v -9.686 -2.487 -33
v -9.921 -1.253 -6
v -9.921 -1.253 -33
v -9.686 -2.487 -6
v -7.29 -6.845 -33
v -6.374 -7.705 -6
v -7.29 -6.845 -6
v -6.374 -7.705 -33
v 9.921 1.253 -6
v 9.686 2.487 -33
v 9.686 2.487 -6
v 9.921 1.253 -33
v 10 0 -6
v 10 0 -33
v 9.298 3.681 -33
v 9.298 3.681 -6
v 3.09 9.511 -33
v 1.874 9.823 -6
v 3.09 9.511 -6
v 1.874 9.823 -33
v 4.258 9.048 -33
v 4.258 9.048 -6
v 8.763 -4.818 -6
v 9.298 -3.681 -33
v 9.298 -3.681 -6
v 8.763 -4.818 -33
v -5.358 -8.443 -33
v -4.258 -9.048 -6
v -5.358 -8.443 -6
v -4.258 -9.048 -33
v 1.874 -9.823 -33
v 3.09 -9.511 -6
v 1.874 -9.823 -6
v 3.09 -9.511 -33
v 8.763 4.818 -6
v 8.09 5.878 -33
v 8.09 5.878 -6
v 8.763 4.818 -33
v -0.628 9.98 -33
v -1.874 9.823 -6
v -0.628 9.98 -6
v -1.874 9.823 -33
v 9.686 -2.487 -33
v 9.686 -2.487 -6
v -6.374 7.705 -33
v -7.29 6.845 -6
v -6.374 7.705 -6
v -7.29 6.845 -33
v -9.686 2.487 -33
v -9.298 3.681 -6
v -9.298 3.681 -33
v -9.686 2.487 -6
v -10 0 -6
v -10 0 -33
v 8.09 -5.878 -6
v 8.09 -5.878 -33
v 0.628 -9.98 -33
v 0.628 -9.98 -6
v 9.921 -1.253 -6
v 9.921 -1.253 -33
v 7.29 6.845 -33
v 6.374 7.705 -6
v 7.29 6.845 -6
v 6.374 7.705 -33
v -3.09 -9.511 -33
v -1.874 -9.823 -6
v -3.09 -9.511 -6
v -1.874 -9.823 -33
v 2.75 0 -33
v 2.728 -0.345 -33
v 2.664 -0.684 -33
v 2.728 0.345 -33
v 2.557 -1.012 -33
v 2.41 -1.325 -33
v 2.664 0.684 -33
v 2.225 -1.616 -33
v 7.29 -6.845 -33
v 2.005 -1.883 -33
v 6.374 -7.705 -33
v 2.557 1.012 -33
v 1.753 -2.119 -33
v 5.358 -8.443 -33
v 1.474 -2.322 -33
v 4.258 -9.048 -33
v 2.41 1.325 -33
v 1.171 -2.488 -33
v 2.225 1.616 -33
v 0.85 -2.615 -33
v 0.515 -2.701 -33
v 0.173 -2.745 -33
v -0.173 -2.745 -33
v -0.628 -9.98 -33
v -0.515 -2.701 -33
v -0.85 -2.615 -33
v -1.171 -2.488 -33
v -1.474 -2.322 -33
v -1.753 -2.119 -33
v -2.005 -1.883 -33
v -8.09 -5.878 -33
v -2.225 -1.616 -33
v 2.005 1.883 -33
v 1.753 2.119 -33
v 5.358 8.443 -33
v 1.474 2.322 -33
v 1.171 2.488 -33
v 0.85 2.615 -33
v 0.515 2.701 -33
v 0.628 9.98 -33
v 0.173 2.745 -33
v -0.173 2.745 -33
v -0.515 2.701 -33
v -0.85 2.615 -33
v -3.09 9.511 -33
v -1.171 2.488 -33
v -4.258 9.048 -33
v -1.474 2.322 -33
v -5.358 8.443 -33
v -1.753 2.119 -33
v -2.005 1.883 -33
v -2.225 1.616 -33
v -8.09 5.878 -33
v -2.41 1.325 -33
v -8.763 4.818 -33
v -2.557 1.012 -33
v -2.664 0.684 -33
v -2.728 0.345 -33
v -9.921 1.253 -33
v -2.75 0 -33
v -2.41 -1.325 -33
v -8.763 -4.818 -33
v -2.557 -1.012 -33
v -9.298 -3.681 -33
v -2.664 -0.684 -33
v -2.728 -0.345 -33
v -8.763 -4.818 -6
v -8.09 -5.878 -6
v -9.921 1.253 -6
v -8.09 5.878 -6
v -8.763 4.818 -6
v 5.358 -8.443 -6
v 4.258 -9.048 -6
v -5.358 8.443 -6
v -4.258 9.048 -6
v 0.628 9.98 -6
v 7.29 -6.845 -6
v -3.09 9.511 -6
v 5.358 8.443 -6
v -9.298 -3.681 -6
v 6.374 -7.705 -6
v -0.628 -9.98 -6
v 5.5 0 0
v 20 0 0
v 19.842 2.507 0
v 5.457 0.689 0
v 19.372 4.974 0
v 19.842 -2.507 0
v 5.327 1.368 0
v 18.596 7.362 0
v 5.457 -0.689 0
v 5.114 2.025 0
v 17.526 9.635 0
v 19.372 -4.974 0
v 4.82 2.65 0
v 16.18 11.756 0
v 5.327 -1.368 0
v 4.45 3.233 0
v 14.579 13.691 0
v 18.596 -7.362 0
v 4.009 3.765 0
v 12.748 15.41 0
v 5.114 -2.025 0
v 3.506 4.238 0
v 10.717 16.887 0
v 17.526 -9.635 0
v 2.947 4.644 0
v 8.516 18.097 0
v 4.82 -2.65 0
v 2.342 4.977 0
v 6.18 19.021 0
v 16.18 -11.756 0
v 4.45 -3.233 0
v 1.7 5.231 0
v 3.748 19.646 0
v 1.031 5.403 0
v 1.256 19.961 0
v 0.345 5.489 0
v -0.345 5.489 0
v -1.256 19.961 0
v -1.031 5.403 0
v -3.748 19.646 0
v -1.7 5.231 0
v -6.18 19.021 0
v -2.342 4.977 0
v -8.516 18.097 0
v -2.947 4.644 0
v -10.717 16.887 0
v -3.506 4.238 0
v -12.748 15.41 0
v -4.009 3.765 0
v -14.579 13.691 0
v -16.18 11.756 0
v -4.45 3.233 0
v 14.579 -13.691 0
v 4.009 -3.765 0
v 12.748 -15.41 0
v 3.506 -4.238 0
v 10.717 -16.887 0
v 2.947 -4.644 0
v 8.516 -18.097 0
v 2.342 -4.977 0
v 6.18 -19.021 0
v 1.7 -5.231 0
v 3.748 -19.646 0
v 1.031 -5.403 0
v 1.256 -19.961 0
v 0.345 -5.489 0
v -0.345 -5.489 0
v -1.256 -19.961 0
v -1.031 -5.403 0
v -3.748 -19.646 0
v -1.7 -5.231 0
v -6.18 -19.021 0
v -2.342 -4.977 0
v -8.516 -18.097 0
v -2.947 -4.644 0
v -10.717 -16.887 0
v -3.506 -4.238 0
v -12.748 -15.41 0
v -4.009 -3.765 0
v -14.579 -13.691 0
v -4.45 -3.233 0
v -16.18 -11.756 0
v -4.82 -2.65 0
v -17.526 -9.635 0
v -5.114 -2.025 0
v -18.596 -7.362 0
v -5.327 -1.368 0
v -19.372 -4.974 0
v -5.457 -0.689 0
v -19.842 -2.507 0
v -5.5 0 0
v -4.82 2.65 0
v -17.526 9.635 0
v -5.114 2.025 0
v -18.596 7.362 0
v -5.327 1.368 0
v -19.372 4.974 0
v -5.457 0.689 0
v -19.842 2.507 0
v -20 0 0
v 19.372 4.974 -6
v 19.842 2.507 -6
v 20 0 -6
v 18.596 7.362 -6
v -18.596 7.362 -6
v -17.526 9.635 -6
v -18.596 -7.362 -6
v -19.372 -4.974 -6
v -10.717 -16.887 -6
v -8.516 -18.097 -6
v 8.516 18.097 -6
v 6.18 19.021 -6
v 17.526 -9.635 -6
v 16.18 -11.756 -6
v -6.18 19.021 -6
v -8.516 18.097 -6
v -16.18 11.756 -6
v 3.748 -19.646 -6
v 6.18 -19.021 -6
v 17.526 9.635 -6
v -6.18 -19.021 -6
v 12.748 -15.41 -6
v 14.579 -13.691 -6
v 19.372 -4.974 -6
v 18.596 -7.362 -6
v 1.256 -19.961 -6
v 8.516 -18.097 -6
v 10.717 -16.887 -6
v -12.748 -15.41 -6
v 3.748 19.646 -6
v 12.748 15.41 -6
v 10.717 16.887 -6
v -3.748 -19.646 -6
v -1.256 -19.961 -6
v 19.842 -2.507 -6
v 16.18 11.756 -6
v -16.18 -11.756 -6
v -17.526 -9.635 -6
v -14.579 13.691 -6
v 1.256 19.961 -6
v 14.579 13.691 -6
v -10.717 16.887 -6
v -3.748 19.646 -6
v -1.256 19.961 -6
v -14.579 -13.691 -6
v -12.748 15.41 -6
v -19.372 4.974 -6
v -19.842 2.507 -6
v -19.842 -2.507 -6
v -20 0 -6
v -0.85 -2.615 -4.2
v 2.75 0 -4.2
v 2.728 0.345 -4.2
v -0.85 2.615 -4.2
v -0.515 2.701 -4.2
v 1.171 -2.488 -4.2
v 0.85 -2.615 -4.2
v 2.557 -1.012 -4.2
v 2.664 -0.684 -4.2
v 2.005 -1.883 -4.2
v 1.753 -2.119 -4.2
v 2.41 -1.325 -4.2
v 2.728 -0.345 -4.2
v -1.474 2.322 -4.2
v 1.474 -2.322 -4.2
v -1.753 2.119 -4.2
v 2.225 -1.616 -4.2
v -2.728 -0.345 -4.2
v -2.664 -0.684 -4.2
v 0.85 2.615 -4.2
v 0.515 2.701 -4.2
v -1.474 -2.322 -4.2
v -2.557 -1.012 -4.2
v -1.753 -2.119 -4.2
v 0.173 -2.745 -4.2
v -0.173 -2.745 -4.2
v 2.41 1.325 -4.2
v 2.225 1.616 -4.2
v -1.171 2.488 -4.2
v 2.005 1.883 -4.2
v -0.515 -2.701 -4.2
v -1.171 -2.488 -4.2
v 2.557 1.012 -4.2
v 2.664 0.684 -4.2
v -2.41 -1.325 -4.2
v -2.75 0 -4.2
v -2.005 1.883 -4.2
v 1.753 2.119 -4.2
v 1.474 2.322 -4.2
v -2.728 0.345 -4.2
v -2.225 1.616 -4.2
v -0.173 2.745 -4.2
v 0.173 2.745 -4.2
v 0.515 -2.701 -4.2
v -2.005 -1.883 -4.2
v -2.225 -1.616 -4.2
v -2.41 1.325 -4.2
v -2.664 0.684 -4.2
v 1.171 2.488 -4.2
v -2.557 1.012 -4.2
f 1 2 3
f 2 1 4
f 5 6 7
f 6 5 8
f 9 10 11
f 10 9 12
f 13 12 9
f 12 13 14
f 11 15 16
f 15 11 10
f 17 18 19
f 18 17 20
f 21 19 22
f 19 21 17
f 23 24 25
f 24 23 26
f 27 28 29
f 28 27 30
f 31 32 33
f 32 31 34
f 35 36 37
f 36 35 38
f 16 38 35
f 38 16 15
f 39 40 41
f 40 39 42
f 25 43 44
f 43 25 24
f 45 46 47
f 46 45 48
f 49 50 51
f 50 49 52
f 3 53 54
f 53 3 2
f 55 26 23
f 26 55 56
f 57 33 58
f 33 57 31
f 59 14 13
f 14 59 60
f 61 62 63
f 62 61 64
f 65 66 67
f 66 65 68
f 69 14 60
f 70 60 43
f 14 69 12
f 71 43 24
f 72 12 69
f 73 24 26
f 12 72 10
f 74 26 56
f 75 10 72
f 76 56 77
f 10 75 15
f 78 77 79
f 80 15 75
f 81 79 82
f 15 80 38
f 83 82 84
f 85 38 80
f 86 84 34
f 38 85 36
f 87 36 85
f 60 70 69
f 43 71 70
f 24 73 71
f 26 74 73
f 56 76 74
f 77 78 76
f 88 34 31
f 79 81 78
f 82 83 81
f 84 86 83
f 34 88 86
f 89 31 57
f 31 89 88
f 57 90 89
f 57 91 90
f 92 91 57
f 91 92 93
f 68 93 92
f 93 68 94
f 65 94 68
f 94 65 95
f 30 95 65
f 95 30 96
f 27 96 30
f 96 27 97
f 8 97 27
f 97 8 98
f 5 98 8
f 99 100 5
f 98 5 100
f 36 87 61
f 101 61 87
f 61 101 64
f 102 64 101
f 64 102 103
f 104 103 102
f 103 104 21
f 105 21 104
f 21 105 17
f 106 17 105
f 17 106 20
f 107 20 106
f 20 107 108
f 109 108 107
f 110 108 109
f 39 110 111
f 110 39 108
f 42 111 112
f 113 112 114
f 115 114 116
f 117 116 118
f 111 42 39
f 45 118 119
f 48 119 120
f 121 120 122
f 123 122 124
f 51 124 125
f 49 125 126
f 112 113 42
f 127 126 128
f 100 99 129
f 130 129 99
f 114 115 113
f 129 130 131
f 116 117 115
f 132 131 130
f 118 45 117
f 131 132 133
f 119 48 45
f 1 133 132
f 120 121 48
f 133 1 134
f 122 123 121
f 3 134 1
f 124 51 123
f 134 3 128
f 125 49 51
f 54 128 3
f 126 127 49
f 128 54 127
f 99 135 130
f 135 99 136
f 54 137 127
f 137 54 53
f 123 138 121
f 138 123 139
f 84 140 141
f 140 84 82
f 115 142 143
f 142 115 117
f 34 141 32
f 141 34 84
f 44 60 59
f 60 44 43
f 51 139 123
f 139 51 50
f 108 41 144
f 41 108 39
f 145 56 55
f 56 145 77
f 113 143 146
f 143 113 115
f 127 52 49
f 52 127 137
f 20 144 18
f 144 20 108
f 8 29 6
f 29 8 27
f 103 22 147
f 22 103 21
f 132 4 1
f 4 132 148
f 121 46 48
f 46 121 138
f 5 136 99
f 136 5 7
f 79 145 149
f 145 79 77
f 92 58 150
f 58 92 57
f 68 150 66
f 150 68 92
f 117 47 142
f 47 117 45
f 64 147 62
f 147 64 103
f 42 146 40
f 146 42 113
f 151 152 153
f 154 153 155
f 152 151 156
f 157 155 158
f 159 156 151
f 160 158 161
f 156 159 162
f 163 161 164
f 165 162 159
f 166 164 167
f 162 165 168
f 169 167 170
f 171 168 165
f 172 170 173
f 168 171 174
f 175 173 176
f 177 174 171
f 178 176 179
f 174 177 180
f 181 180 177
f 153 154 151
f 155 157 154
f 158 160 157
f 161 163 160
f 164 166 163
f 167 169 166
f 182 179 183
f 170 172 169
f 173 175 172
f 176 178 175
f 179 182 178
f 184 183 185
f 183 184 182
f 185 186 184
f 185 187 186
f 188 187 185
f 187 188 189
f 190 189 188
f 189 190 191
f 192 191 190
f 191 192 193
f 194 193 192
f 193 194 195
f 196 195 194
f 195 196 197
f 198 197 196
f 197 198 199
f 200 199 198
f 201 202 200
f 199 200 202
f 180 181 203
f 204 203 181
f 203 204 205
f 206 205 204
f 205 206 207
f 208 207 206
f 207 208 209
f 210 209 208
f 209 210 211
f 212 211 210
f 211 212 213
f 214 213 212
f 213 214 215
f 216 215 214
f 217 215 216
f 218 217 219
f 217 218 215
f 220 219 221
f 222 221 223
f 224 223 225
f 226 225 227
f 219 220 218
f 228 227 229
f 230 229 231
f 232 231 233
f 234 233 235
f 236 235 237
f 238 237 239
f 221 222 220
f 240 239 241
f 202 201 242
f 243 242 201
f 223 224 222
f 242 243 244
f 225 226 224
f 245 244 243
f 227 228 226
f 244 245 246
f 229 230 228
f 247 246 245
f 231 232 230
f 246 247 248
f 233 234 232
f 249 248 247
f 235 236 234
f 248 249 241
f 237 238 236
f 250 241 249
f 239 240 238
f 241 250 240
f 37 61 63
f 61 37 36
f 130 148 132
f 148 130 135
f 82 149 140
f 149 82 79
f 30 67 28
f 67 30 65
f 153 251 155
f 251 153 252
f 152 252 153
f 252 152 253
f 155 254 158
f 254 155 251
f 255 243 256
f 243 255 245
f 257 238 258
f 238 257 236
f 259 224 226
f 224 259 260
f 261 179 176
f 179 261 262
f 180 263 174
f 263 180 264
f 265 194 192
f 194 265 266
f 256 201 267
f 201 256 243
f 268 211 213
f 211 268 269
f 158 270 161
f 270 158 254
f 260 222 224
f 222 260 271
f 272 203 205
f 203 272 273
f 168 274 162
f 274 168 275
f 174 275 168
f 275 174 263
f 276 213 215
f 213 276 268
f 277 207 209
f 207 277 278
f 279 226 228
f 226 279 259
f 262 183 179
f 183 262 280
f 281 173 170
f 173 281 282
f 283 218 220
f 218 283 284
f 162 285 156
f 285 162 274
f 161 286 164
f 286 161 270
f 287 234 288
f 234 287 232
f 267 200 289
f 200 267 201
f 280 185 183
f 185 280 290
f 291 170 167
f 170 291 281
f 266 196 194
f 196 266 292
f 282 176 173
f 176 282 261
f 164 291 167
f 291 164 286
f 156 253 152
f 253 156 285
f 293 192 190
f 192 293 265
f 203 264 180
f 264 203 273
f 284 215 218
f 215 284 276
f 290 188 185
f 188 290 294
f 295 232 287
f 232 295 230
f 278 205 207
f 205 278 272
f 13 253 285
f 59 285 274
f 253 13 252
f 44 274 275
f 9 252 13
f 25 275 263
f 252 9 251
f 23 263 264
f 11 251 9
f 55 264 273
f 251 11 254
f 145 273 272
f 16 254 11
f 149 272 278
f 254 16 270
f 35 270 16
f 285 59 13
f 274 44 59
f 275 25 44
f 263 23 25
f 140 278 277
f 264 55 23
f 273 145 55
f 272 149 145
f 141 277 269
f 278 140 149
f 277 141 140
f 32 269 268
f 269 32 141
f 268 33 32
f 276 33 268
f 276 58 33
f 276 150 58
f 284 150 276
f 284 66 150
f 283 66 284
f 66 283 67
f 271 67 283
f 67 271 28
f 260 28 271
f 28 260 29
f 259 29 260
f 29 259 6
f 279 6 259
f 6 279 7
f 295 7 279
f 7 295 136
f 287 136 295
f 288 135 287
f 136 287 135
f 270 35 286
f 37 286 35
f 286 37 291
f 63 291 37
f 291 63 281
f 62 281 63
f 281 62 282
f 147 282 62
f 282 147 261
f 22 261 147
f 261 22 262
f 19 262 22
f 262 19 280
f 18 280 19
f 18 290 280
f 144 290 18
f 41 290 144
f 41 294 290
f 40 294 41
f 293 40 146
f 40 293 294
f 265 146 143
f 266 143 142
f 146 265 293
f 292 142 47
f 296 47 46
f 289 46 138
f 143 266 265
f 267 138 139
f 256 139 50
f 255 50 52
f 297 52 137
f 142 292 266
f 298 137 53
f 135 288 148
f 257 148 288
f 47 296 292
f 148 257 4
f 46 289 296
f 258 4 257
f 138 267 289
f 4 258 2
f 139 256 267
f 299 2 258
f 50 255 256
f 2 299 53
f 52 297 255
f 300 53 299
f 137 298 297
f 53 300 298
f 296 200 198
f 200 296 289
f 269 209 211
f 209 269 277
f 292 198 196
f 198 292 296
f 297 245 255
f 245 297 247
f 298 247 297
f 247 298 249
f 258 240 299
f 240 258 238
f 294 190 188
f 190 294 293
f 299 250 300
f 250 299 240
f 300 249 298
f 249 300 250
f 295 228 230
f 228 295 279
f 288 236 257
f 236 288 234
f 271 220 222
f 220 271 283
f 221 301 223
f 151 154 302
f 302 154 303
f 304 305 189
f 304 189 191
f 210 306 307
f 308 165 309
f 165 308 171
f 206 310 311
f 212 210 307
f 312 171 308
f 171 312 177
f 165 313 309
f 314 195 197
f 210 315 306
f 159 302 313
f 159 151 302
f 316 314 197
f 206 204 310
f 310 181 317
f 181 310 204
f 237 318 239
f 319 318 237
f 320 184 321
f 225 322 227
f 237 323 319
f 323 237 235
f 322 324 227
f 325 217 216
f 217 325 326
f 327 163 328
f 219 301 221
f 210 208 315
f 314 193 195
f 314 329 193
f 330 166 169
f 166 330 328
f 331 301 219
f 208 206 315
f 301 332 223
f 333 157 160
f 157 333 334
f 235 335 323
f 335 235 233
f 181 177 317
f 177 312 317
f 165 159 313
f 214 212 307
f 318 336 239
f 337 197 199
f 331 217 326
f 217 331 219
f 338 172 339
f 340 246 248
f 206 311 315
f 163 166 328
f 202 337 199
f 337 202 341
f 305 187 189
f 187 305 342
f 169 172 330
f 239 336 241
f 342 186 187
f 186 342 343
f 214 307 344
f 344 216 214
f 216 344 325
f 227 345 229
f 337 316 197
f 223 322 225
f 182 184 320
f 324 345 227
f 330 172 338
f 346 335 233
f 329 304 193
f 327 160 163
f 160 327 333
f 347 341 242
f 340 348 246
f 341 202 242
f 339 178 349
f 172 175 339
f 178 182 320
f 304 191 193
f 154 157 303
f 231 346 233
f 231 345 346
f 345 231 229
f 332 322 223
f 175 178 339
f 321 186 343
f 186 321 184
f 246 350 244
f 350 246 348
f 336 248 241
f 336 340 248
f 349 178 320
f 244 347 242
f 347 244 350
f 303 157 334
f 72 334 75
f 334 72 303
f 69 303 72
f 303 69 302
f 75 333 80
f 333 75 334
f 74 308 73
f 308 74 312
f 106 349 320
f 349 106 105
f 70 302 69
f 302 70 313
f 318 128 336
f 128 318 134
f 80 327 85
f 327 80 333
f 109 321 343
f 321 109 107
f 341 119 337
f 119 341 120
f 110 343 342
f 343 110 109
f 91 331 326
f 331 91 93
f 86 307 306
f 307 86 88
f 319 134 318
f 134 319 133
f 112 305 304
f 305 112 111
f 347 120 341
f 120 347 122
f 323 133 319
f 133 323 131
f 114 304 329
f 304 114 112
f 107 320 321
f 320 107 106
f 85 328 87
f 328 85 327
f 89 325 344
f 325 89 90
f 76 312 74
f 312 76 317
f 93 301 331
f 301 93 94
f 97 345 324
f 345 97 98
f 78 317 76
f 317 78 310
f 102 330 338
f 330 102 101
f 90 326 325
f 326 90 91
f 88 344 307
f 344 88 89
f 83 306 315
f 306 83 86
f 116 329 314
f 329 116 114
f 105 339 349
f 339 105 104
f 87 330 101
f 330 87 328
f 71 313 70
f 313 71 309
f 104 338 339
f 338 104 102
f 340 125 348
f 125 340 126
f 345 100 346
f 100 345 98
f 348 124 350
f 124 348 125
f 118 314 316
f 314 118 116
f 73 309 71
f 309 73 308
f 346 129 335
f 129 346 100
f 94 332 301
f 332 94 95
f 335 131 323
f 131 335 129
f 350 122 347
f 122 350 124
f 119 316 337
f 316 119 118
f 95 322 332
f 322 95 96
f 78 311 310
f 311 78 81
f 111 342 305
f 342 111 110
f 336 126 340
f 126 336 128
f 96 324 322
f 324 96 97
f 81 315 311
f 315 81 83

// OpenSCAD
$fn = 50;


difference() {
	union() {
		translate(v = [0, 0, -33.0000000000]) {
			cylinder(h = 33, r = 10.0000000000);
		}
		translate(v = [0, 0, -6.0000000000]) {
			cylinder(h = 6, r = 20.0000000000);
		}
	}
	union() {
		translate(v = [0, 0, 0]) {
			rotate(a = [0, 0, 0]) {
				difference() {
					union() {
						#translate(v = [0, 0, -33.0000000000]) {
							cylinder(h = 33, r = 2.2500000000);
						}
						#translate(v = [0, 0, -4.2000000000]) {
							cylinder(h = 4.2000000000, r1 = 2.7500000000, r2 = 5.5000000000);
						}
						#translate(v = [0, 0, -33.0000000000]) {
							cylinder(h = 33, r = 2.7500000000);
						}
						#translate(v = [0, 0, -33.0000000000]) {
							cylinder(h = 33, r = 2.2500000000);
						}
					}
					union();
				}
			}
		}
	}
}
